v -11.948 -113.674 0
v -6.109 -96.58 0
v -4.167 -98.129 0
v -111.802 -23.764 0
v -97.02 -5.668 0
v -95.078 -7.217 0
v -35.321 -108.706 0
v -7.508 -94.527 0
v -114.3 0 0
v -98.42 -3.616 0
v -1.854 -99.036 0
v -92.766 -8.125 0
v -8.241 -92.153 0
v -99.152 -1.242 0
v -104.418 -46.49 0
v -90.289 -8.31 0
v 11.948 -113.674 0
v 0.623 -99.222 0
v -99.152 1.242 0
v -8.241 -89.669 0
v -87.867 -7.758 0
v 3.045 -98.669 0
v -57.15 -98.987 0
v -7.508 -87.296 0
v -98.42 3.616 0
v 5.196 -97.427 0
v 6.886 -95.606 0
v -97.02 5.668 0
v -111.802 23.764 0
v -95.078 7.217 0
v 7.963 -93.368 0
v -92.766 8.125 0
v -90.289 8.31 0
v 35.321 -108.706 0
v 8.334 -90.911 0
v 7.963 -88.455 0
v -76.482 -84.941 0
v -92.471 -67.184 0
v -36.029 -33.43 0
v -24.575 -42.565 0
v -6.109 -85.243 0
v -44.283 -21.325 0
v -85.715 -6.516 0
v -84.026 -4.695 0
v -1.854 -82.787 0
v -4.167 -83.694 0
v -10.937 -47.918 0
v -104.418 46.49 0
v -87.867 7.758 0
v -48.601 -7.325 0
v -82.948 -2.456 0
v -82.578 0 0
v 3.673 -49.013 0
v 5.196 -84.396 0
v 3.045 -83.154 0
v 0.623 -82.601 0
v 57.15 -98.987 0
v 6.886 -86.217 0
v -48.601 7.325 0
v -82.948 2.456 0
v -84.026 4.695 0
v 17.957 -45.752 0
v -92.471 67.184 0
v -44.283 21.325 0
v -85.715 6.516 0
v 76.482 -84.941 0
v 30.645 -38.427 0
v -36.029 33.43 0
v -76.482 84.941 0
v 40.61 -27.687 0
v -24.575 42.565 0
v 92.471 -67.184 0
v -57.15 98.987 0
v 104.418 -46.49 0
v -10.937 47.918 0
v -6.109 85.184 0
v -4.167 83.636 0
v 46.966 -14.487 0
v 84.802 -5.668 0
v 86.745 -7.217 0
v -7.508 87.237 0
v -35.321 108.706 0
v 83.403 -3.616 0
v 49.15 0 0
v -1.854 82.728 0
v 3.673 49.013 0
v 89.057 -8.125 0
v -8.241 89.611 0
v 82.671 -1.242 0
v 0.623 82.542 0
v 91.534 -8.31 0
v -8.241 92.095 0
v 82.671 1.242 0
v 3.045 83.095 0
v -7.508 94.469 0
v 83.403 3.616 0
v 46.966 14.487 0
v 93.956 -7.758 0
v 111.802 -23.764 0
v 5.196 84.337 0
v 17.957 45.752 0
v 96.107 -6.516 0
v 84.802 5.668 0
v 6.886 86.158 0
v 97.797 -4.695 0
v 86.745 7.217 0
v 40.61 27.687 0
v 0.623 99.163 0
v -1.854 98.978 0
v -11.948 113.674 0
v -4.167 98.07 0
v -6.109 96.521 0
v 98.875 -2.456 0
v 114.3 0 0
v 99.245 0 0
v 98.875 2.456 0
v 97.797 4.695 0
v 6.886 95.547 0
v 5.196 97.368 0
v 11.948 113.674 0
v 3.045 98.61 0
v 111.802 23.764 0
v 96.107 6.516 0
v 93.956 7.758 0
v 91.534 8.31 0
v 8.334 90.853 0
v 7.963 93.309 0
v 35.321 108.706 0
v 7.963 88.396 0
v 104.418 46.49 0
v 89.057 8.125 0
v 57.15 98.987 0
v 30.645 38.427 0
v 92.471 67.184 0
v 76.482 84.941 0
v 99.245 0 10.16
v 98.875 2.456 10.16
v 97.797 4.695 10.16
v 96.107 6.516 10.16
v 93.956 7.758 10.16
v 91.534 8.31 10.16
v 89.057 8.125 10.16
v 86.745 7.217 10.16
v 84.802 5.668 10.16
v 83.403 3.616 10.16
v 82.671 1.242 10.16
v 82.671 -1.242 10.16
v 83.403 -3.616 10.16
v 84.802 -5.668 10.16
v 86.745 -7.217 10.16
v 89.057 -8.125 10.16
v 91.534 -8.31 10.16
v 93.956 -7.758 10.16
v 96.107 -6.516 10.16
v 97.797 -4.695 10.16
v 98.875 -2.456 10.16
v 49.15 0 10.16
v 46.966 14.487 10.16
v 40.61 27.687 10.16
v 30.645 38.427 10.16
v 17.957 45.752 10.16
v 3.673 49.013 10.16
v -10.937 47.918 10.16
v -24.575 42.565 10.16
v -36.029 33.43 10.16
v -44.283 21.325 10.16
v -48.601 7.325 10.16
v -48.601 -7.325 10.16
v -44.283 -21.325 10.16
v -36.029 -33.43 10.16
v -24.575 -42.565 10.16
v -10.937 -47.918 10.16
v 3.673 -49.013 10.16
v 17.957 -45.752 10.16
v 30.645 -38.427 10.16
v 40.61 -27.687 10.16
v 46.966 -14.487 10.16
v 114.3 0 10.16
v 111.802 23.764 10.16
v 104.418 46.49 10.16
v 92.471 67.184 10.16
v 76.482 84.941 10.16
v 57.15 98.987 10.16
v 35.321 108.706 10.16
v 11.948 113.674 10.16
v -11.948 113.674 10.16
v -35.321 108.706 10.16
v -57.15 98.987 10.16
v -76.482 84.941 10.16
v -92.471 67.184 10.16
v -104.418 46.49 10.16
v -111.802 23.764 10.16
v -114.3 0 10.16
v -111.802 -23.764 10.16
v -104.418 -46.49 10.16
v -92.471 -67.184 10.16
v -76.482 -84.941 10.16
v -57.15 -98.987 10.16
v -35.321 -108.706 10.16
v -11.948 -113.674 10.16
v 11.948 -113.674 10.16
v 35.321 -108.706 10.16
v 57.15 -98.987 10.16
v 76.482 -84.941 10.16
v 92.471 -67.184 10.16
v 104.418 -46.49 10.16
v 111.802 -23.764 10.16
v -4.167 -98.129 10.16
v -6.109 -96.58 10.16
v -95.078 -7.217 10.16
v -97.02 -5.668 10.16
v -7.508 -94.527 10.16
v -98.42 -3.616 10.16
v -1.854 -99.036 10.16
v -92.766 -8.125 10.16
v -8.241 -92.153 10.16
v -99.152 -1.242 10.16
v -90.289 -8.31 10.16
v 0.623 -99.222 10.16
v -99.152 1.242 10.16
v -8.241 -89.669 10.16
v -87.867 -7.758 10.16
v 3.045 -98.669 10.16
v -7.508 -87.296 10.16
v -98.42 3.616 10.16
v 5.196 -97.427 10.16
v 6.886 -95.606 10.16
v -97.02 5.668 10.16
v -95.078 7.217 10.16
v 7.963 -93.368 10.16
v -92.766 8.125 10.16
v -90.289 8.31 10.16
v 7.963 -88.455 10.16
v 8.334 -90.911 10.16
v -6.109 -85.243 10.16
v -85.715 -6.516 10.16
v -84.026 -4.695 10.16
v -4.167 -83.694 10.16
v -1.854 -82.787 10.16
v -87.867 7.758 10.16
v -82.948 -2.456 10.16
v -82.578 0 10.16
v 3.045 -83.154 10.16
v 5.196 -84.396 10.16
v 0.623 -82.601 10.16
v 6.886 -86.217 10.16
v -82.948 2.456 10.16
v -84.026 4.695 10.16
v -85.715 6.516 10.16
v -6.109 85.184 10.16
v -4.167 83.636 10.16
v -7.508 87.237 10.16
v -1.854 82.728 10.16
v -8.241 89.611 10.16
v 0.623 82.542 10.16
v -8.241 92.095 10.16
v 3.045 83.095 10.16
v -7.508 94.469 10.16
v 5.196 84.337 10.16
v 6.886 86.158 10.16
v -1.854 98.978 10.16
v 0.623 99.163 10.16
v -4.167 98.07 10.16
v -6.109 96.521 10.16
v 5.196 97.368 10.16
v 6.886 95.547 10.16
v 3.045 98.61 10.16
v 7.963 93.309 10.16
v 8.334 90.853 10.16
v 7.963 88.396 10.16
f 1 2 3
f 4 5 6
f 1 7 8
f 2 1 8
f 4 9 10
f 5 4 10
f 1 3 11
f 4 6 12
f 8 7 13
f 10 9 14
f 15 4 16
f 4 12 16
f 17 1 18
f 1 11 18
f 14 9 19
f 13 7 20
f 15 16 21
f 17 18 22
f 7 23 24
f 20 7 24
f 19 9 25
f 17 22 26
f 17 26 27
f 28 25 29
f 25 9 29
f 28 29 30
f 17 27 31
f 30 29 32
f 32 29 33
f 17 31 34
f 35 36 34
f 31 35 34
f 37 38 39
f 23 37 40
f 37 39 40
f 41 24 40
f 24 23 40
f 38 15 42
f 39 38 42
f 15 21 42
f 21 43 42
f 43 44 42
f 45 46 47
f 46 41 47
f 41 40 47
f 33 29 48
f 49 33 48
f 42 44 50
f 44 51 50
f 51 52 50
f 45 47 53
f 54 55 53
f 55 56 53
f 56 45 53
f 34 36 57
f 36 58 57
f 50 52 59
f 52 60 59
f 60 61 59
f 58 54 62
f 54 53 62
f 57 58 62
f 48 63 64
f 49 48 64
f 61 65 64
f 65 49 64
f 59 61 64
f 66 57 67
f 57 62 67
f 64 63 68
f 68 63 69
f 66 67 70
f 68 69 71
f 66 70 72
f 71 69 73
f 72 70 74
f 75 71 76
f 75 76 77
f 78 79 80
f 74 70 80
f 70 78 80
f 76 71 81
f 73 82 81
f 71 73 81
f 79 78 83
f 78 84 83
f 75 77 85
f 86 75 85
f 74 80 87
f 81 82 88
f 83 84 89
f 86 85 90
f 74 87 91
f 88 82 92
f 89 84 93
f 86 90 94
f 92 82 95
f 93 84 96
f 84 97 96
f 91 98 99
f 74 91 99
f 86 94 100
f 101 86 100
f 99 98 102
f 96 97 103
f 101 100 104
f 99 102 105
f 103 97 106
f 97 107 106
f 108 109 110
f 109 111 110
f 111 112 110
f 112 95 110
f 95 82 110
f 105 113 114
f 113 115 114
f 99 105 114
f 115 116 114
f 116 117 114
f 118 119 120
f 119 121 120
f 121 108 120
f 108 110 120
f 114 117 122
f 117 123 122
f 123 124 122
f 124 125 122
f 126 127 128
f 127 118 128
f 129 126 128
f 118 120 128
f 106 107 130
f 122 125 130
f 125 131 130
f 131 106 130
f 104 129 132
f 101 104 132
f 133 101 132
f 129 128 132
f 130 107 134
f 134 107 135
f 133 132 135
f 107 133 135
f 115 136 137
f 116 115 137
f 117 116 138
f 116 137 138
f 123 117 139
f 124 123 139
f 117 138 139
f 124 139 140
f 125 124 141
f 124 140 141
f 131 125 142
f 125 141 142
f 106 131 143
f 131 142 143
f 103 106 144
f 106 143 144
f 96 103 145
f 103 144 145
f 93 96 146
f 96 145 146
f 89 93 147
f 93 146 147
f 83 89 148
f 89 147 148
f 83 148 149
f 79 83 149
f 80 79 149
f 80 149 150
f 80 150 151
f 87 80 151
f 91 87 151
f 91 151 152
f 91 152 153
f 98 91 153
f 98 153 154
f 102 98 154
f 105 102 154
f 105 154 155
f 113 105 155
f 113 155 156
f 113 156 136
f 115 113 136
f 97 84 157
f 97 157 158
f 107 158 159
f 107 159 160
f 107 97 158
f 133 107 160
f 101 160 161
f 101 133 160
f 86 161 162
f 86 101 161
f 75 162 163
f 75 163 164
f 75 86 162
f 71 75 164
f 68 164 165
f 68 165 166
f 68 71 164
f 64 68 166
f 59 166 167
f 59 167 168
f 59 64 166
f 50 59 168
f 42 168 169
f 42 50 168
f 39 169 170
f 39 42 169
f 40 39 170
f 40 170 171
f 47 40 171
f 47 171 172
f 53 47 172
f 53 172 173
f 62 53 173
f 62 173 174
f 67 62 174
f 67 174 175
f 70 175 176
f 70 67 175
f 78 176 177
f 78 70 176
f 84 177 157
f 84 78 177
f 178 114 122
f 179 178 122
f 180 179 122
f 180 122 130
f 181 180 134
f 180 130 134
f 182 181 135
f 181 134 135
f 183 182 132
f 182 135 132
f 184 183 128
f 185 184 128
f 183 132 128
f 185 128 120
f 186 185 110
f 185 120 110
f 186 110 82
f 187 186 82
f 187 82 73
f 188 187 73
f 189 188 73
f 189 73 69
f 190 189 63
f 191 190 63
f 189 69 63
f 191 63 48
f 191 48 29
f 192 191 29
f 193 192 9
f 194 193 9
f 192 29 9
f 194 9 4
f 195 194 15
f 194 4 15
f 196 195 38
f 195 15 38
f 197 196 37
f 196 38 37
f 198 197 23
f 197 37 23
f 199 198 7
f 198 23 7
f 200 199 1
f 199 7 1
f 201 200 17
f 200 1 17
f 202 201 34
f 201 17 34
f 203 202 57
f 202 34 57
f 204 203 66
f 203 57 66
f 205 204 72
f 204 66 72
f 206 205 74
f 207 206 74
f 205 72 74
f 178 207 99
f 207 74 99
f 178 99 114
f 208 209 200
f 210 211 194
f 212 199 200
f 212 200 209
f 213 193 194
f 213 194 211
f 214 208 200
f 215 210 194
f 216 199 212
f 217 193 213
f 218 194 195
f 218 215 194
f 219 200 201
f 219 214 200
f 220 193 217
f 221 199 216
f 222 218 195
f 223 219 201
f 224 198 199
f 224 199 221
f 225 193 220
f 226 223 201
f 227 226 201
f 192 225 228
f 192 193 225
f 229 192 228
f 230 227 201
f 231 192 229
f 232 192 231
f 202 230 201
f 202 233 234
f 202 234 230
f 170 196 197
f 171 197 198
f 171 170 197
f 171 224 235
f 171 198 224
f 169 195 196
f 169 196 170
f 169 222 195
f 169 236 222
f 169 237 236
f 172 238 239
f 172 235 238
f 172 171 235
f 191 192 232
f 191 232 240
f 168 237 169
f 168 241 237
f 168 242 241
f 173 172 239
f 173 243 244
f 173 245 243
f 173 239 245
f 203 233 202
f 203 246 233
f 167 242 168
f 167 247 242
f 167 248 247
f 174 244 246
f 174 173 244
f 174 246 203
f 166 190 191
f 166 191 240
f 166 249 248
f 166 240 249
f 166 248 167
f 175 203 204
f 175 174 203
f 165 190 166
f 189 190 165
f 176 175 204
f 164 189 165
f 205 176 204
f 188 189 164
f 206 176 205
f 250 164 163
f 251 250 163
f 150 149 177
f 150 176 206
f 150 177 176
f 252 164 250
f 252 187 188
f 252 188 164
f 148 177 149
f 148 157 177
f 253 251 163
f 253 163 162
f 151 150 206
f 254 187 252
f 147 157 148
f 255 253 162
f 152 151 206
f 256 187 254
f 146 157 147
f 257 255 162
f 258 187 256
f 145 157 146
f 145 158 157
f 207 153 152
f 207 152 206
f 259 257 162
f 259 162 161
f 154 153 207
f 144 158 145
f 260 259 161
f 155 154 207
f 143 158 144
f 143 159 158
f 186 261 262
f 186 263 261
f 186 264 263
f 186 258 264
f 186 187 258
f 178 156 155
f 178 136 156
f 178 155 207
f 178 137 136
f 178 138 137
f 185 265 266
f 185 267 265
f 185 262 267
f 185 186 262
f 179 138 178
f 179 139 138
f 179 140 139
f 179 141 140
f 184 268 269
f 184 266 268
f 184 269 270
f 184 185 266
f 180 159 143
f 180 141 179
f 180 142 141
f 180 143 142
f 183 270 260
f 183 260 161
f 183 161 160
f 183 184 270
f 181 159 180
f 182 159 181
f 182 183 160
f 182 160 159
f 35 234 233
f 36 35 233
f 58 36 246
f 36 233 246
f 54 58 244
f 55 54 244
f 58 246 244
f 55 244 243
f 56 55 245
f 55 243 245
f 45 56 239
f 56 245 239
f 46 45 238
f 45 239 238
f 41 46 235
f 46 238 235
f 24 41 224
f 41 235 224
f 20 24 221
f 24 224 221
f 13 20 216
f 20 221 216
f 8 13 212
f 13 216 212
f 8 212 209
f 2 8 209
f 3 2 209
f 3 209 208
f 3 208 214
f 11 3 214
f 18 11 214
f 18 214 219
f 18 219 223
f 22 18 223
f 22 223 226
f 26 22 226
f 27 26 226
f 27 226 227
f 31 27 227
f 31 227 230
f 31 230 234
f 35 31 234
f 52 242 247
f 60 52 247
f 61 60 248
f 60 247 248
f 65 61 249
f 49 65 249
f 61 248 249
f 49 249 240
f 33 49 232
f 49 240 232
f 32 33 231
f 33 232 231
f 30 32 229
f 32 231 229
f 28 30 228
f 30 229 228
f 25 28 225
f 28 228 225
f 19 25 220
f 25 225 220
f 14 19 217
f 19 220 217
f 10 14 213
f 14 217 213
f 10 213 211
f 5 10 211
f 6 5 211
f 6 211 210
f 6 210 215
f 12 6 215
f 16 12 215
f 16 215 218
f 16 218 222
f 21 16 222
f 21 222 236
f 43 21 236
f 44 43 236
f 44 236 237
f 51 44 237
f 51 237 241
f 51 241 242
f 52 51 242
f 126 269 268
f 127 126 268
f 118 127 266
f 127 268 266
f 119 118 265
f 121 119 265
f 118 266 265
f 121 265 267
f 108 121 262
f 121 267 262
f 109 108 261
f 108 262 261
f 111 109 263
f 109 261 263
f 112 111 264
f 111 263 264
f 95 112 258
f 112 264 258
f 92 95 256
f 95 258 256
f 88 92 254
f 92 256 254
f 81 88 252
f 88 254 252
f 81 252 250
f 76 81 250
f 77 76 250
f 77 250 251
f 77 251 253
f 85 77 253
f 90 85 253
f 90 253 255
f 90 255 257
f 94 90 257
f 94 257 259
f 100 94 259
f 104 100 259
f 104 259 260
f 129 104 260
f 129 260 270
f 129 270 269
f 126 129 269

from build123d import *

# Parameters (mm, degrees)
SKETCH1_R               = 114.3
SKETCH1_R_2             = 49.149999464
EXTRUDE1_DEPTH          = 10.16
F_5_8_CLEARANCE_HOLE1_D = 16.66748


with BuildPart() as part:
    # Sketch1 → Extrude1 (new body)
    with BuildSketch(Plane.XY):
        Circle(SKETCH1_R)
        Circle(SKETCH1_R_2, mode=Mode.SUBTRACT)
    extrude(amount=EXTRUDE1_DEPTH)

    # 5/8 Clearance Hole1 (through all)
    with Locations(Plane(origin=(-61.229912904, -86.94526051, 0), x_dir=(-1, 0, 0), z_dir=(0, 0, -1))):
        with Locations((-61.229912904, 177.798020209), (29.681467244, 86.94526051), (-61.229912904, -3.966119638), (-152.141293051, 86.94526051)):
            Hole(F_5_8_CLEARANCE_HOLE1_D / 2)


solid = part.part
